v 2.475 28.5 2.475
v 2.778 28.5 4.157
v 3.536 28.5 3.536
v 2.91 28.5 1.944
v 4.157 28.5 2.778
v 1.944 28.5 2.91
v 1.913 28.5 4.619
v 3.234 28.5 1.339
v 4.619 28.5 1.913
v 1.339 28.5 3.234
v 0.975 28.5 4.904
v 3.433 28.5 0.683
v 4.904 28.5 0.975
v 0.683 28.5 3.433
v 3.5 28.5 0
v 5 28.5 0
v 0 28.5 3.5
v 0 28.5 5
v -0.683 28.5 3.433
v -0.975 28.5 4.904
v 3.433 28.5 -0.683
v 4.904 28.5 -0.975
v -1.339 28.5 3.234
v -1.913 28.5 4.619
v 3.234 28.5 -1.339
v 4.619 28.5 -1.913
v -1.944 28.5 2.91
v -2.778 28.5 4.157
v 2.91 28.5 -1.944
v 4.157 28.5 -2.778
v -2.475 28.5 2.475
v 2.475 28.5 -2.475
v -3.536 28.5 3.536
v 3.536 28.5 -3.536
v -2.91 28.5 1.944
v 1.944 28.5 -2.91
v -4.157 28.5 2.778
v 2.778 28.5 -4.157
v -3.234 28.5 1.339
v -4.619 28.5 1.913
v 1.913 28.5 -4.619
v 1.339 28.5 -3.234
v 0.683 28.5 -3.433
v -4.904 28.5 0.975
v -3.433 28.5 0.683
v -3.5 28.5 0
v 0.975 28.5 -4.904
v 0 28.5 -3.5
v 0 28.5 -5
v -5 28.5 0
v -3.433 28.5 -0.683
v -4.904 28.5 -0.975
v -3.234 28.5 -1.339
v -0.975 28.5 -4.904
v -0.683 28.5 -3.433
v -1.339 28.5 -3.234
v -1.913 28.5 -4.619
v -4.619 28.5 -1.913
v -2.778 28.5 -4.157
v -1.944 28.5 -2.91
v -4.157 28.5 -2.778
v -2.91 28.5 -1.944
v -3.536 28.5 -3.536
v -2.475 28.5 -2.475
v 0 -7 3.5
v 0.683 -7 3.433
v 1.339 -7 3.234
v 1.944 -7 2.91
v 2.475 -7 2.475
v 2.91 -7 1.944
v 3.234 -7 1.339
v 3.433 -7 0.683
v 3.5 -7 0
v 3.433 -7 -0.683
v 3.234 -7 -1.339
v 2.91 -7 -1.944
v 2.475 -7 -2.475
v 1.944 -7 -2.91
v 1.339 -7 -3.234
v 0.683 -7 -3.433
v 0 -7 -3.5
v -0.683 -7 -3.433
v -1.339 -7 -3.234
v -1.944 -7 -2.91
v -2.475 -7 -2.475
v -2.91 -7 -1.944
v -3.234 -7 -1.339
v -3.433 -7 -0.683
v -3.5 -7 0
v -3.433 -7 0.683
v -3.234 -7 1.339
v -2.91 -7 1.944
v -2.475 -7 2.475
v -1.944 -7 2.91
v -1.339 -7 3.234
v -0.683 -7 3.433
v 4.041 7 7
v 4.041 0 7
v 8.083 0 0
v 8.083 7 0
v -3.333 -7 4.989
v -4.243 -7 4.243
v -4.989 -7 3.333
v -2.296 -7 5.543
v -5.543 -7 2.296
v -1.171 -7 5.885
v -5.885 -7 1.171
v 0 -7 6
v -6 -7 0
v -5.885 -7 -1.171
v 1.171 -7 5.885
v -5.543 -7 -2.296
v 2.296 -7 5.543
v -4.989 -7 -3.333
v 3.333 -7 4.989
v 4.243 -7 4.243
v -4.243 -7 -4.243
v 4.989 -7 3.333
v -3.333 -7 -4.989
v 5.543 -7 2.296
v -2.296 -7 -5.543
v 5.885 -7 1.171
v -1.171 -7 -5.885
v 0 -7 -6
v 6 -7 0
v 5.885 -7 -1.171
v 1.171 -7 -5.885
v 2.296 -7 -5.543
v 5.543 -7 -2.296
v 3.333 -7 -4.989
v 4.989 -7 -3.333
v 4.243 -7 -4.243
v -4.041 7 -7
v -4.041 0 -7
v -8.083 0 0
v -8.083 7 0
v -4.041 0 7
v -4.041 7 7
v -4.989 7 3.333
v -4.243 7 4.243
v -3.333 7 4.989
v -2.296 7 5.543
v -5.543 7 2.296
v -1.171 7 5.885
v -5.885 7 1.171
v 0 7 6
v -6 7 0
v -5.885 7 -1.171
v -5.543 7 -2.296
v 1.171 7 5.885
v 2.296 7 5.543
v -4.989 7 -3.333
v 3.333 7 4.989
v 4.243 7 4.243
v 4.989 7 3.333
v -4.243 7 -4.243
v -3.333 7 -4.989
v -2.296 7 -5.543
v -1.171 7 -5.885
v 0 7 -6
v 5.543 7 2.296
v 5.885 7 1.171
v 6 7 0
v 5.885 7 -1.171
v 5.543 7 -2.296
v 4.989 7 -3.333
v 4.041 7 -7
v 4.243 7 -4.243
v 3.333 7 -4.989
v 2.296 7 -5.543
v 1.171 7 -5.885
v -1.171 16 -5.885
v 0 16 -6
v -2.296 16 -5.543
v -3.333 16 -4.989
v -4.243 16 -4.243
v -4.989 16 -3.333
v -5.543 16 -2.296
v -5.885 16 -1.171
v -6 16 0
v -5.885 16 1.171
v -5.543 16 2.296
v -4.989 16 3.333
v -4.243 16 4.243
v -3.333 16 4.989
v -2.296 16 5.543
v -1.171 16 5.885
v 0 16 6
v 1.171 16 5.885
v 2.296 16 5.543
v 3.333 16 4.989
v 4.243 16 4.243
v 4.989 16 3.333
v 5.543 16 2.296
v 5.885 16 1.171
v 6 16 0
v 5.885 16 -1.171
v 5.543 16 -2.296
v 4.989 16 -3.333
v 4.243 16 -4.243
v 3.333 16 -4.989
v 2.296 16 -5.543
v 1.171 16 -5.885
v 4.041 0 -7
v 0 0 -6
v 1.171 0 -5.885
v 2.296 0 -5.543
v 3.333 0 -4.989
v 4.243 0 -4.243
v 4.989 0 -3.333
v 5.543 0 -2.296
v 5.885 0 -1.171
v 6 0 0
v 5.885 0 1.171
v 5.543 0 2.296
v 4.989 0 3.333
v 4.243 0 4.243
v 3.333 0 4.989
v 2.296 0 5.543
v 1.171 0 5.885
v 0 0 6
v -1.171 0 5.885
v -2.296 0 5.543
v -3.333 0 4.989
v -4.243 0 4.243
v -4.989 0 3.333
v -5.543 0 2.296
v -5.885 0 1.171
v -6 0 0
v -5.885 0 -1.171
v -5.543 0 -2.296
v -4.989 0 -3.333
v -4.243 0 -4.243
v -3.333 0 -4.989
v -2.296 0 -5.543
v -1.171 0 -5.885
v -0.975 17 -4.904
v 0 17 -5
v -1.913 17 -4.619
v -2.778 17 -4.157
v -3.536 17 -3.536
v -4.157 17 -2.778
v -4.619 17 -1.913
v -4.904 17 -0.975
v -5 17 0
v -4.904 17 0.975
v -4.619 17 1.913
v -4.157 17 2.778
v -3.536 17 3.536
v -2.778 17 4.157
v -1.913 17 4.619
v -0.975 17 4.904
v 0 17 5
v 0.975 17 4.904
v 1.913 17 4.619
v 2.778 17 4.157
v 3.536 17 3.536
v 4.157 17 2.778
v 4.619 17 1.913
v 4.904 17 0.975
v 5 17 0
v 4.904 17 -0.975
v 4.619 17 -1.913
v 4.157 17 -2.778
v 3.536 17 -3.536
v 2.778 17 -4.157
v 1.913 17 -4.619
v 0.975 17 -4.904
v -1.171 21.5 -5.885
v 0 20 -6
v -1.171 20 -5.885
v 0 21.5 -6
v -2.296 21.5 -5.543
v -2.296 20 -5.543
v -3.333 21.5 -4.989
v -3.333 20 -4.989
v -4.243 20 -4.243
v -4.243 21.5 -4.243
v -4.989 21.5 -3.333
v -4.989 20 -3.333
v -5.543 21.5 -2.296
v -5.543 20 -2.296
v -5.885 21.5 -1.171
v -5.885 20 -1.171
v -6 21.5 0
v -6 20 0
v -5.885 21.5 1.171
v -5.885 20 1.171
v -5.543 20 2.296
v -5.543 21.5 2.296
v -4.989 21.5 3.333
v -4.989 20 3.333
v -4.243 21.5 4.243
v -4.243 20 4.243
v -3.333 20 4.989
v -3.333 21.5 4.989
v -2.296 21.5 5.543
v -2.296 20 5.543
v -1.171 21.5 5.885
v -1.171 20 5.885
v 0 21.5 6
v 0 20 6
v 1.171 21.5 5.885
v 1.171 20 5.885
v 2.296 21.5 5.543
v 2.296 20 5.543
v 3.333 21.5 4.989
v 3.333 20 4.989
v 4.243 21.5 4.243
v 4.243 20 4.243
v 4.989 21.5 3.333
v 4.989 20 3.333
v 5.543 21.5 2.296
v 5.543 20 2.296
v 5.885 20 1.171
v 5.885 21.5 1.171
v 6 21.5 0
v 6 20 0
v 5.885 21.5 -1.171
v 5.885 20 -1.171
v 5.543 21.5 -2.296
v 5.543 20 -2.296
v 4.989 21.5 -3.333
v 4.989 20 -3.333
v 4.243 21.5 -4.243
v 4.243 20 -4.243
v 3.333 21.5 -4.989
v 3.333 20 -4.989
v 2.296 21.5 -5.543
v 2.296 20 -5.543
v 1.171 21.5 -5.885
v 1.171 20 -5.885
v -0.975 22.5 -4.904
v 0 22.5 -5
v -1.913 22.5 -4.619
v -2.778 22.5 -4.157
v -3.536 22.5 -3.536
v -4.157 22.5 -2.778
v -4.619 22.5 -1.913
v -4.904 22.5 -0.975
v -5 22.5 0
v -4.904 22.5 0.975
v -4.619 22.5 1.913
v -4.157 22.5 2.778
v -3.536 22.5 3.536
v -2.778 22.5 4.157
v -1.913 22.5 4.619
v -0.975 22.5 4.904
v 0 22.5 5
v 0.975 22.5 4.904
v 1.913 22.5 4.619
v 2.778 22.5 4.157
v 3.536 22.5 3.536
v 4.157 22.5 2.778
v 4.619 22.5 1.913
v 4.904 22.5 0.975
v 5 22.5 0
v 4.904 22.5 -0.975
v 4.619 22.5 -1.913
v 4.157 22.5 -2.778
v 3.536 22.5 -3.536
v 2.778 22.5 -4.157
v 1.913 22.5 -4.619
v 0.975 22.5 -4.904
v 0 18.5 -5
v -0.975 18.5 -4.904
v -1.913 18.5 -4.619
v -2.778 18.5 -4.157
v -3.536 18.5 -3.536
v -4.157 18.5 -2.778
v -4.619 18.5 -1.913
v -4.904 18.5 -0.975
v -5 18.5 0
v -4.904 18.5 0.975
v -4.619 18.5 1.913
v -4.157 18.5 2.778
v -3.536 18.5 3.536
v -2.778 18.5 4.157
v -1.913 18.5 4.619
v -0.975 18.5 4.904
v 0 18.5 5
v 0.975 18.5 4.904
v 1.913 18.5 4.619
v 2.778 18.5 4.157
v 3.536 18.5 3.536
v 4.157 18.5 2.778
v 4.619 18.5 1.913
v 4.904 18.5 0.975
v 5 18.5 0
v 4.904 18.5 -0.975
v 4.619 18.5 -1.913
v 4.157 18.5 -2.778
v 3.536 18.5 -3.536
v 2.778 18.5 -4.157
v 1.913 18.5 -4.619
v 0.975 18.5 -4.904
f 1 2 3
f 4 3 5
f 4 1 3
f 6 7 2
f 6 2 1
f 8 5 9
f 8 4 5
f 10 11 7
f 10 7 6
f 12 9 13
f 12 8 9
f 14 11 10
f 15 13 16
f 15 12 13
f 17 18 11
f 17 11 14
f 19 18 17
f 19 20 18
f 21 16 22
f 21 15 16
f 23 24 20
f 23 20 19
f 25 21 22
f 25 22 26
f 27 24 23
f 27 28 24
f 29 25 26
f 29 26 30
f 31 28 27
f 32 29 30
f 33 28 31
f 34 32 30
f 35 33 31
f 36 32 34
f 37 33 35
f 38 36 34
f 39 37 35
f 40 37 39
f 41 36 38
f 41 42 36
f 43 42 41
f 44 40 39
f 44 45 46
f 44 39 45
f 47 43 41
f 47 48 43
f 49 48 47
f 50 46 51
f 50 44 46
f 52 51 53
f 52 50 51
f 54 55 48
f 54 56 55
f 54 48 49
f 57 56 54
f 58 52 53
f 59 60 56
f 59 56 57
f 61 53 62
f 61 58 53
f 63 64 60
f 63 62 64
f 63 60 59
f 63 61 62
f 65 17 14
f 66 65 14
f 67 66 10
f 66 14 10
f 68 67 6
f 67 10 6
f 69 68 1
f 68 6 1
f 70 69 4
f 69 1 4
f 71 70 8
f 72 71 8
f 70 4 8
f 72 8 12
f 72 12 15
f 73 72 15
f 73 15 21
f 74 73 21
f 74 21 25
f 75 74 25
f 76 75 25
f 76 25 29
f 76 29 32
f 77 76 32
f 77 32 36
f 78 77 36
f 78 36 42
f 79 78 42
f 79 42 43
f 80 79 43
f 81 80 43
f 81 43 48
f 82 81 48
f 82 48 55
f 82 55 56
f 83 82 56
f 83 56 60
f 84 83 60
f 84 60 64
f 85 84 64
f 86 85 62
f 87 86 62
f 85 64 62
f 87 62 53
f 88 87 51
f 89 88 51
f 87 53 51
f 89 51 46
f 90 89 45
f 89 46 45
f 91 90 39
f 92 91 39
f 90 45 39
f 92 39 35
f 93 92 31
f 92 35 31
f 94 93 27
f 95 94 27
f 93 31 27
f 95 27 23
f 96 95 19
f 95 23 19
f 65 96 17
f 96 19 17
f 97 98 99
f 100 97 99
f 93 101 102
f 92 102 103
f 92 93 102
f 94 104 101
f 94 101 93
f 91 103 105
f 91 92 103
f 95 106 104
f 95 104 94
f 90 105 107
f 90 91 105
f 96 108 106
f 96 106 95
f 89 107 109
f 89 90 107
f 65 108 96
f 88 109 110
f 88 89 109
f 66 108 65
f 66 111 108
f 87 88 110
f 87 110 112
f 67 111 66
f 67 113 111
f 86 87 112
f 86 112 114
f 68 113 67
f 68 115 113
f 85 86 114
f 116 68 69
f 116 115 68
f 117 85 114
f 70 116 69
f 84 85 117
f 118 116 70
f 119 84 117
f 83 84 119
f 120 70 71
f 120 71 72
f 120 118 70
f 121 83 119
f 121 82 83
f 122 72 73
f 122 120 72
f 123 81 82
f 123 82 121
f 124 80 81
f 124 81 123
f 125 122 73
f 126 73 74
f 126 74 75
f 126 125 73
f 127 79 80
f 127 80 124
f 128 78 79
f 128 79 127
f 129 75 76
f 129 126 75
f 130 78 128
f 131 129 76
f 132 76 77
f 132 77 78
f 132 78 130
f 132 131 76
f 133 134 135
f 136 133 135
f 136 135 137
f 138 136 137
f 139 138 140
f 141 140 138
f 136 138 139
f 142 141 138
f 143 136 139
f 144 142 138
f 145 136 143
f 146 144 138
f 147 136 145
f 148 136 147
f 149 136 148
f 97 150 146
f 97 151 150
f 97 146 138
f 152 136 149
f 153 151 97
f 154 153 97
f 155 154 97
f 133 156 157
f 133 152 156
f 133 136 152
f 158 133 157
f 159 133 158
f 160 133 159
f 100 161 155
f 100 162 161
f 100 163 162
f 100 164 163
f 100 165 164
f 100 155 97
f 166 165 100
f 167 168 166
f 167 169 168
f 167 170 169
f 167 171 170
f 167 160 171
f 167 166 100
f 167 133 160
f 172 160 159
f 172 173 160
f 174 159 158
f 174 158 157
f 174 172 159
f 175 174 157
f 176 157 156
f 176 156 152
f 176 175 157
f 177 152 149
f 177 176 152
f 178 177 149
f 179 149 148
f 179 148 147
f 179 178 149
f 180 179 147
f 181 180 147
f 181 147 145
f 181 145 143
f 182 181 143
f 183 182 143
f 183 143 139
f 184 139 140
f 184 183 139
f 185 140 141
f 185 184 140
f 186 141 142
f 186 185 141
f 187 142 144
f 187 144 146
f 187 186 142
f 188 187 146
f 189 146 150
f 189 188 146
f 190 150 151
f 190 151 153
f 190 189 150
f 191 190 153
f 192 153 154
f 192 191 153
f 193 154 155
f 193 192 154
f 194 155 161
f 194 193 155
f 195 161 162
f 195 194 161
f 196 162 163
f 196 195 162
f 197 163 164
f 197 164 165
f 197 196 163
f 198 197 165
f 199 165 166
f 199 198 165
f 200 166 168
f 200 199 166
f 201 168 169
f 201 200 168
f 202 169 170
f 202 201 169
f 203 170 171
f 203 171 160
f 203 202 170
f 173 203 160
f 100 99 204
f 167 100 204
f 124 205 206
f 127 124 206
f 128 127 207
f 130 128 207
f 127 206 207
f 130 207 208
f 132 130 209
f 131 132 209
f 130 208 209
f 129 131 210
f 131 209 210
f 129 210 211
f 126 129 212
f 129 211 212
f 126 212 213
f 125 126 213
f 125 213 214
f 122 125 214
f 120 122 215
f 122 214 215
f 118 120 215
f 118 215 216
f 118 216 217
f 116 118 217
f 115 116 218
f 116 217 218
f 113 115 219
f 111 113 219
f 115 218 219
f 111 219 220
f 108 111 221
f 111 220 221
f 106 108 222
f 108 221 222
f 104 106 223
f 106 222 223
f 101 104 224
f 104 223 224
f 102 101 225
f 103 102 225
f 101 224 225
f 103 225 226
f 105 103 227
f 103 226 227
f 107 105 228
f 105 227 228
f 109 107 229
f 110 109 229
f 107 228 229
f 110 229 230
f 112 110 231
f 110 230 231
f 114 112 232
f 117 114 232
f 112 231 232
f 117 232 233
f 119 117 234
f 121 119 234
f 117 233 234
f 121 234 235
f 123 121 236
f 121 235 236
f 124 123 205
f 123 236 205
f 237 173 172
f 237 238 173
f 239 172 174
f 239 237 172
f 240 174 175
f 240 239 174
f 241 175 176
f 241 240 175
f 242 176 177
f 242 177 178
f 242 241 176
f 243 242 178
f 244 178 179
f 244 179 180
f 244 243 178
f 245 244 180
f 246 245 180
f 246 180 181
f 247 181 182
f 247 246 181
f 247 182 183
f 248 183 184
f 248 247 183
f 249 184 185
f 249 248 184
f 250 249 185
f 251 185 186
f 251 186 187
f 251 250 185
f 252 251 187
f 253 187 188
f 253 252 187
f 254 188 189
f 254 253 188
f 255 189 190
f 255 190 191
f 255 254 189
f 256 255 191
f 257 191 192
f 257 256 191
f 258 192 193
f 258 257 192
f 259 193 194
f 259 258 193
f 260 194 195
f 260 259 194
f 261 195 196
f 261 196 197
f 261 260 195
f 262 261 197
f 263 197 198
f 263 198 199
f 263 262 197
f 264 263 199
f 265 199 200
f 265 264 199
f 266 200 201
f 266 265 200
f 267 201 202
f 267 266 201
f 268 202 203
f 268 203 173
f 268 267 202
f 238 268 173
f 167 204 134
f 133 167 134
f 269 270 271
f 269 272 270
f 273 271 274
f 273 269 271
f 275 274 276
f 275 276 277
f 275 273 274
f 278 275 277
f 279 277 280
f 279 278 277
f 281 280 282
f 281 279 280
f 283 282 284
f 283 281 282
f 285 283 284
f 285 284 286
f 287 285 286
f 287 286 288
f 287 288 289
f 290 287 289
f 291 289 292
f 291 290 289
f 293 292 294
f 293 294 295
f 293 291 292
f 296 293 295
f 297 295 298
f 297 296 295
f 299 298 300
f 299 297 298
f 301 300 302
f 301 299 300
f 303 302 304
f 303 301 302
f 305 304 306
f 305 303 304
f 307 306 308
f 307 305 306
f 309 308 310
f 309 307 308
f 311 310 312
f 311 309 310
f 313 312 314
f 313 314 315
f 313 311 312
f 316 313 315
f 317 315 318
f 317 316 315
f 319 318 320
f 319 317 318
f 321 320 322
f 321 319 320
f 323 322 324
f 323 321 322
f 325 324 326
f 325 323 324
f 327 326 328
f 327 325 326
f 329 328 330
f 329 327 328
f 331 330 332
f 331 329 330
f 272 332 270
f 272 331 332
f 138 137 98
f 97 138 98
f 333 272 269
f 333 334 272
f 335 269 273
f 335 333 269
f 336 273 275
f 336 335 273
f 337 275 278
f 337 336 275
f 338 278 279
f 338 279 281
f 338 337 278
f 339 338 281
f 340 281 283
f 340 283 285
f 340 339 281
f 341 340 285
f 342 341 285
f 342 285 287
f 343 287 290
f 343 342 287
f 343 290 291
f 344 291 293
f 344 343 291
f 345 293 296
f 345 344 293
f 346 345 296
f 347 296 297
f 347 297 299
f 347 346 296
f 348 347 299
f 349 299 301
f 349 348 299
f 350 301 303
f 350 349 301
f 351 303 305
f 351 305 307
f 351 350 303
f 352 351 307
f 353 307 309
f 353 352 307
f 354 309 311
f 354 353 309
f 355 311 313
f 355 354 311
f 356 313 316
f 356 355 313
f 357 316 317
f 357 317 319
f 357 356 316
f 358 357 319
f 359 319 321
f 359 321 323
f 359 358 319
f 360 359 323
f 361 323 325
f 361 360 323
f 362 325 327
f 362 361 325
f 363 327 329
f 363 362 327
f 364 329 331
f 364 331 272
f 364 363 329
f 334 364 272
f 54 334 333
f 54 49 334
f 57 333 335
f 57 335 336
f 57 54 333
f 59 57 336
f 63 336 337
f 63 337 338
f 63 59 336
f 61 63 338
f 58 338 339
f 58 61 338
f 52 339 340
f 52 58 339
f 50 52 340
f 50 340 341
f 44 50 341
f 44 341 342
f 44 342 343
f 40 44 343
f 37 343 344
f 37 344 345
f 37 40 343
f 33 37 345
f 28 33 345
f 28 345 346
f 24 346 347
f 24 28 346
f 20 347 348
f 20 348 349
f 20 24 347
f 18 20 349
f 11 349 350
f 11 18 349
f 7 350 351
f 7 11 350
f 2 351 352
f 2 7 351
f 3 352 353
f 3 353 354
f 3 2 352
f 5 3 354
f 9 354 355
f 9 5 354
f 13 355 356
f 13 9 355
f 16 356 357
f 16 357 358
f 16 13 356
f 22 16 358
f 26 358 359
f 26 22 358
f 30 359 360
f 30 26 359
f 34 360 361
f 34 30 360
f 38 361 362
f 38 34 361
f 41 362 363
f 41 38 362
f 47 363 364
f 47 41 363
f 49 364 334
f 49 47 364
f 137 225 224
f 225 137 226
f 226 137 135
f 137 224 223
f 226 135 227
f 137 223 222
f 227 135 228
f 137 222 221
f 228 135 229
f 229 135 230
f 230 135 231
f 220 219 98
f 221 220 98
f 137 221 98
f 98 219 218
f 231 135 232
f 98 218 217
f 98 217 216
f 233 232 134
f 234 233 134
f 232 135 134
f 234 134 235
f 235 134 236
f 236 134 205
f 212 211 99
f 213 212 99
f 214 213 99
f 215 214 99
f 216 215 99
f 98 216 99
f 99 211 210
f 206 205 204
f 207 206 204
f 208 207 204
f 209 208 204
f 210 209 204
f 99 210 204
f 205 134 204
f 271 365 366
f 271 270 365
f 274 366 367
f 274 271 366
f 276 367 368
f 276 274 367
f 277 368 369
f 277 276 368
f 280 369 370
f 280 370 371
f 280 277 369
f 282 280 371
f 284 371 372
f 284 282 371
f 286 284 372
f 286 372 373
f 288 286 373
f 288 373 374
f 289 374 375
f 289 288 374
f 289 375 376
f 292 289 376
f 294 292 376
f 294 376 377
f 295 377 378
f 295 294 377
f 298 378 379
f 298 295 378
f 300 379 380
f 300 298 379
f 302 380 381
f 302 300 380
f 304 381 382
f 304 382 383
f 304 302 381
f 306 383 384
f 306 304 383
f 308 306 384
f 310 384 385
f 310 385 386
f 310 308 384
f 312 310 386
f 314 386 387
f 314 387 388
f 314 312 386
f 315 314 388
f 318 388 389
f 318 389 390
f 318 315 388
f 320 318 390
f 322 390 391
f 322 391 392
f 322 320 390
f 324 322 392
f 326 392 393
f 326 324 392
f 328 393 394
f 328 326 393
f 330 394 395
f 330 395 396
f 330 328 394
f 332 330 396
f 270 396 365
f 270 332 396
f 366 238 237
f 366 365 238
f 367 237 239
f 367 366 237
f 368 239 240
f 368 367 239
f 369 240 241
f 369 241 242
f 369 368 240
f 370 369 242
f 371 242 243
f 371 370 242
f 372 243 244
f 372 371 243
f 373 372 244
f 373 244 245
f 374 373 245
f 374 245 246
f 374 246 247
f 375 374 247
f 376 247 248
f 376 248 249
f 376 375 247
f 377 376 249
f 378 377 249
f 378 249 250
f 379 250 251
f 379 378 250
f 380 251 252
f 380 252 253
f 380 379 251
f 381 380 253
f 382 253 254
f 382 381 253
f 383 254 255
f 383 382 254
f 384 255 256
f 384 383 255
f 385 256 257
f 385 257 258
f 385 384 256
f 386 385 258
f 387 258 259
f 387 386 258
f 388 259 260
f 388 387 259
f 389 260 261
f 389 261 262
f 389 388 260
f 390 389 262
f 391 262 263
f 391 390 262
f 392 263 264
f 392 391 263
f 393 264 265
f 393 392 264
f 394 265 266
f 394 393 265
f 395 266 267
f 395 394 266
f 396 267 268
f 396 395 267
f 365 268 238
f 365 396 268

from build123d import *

# Parameters (mm, degrees)
AUFSATZ_LINEAR_AUSTRAGEN1_DEPTH = 7
SKIZZE4_R                       = 6
AUFSATZ_LINEAR_AUSTRAGEN3_DEPTH = 7
SKIZZE5_R                       = 3.5
SCHNITT_LINEAR_AUSTRAGEN1_DEPTH = 38.075373678


with BuildPart() as part:
    # Skizze1 → Aufsatz-Linear austragen1 (new body)
    with BuildSketch(Plane(origin=(0, 0, 0), x_dir=(1, 0, 0), z_dir=(0, 1, 0))):
        Polygon((8.082903769, 0), (4.041451884, 7), (-4.041451884, 7), (-8.082903769, 0), (-4.041451884, -7), (4.041451884, -7), align=None)
    extrude(amount=AUFSATZ_LINEAR_AUSTRAGEN1_DEPTH)

    # Skizze3 → Rotation1 (revolve)
    with BuildSketch(Plane.XY, mode=Mode.PRIVATE) as rotation1_sk:
        Polygon((0, 7), (-6, 7), (-6, 16), (-5, 17), (-5, 18.5), (-6, 20), (-6, 21.5), (-5, 22.5), (-5, 28.5), (0, 28.5), align=None)
    revolve(rotation1_sk.sketch.rotate(Axis((0, 0, 0), (0, 1, 0)), 270), axis=Axis((0, 0, 0), (0, 1, 0)))

    # Skizze4 → Aufsatz-Linear austragen3 (add)
    with BuildSketch(Plane.XZ):
        with Locations(Location((0, 0, 0), (0, 0, 270))):
            Circle(SKIZZE4_R)
    extrude(amount=AUFSATZ_LINEAR_AUSTRAGEN3_DEPTH)

    # Skizze5 → Schnitt-Linear austragen1 (cut, through all)
    with BuildSketch(Plane(origin=(0, 28.5, 0), x_dir=(1, 0, 0), z_dir=(0, 1, 0))):
        with Locations(Location((0, 0, 0), (0, 0, 270))):
            Circle(SKIZZE5_R)
    extrude(amount=-SCHNITT_LINEAR_AUSTRAGEN1_DEPTH, mode=Mode.SUBTRACT)


solid = part.part
